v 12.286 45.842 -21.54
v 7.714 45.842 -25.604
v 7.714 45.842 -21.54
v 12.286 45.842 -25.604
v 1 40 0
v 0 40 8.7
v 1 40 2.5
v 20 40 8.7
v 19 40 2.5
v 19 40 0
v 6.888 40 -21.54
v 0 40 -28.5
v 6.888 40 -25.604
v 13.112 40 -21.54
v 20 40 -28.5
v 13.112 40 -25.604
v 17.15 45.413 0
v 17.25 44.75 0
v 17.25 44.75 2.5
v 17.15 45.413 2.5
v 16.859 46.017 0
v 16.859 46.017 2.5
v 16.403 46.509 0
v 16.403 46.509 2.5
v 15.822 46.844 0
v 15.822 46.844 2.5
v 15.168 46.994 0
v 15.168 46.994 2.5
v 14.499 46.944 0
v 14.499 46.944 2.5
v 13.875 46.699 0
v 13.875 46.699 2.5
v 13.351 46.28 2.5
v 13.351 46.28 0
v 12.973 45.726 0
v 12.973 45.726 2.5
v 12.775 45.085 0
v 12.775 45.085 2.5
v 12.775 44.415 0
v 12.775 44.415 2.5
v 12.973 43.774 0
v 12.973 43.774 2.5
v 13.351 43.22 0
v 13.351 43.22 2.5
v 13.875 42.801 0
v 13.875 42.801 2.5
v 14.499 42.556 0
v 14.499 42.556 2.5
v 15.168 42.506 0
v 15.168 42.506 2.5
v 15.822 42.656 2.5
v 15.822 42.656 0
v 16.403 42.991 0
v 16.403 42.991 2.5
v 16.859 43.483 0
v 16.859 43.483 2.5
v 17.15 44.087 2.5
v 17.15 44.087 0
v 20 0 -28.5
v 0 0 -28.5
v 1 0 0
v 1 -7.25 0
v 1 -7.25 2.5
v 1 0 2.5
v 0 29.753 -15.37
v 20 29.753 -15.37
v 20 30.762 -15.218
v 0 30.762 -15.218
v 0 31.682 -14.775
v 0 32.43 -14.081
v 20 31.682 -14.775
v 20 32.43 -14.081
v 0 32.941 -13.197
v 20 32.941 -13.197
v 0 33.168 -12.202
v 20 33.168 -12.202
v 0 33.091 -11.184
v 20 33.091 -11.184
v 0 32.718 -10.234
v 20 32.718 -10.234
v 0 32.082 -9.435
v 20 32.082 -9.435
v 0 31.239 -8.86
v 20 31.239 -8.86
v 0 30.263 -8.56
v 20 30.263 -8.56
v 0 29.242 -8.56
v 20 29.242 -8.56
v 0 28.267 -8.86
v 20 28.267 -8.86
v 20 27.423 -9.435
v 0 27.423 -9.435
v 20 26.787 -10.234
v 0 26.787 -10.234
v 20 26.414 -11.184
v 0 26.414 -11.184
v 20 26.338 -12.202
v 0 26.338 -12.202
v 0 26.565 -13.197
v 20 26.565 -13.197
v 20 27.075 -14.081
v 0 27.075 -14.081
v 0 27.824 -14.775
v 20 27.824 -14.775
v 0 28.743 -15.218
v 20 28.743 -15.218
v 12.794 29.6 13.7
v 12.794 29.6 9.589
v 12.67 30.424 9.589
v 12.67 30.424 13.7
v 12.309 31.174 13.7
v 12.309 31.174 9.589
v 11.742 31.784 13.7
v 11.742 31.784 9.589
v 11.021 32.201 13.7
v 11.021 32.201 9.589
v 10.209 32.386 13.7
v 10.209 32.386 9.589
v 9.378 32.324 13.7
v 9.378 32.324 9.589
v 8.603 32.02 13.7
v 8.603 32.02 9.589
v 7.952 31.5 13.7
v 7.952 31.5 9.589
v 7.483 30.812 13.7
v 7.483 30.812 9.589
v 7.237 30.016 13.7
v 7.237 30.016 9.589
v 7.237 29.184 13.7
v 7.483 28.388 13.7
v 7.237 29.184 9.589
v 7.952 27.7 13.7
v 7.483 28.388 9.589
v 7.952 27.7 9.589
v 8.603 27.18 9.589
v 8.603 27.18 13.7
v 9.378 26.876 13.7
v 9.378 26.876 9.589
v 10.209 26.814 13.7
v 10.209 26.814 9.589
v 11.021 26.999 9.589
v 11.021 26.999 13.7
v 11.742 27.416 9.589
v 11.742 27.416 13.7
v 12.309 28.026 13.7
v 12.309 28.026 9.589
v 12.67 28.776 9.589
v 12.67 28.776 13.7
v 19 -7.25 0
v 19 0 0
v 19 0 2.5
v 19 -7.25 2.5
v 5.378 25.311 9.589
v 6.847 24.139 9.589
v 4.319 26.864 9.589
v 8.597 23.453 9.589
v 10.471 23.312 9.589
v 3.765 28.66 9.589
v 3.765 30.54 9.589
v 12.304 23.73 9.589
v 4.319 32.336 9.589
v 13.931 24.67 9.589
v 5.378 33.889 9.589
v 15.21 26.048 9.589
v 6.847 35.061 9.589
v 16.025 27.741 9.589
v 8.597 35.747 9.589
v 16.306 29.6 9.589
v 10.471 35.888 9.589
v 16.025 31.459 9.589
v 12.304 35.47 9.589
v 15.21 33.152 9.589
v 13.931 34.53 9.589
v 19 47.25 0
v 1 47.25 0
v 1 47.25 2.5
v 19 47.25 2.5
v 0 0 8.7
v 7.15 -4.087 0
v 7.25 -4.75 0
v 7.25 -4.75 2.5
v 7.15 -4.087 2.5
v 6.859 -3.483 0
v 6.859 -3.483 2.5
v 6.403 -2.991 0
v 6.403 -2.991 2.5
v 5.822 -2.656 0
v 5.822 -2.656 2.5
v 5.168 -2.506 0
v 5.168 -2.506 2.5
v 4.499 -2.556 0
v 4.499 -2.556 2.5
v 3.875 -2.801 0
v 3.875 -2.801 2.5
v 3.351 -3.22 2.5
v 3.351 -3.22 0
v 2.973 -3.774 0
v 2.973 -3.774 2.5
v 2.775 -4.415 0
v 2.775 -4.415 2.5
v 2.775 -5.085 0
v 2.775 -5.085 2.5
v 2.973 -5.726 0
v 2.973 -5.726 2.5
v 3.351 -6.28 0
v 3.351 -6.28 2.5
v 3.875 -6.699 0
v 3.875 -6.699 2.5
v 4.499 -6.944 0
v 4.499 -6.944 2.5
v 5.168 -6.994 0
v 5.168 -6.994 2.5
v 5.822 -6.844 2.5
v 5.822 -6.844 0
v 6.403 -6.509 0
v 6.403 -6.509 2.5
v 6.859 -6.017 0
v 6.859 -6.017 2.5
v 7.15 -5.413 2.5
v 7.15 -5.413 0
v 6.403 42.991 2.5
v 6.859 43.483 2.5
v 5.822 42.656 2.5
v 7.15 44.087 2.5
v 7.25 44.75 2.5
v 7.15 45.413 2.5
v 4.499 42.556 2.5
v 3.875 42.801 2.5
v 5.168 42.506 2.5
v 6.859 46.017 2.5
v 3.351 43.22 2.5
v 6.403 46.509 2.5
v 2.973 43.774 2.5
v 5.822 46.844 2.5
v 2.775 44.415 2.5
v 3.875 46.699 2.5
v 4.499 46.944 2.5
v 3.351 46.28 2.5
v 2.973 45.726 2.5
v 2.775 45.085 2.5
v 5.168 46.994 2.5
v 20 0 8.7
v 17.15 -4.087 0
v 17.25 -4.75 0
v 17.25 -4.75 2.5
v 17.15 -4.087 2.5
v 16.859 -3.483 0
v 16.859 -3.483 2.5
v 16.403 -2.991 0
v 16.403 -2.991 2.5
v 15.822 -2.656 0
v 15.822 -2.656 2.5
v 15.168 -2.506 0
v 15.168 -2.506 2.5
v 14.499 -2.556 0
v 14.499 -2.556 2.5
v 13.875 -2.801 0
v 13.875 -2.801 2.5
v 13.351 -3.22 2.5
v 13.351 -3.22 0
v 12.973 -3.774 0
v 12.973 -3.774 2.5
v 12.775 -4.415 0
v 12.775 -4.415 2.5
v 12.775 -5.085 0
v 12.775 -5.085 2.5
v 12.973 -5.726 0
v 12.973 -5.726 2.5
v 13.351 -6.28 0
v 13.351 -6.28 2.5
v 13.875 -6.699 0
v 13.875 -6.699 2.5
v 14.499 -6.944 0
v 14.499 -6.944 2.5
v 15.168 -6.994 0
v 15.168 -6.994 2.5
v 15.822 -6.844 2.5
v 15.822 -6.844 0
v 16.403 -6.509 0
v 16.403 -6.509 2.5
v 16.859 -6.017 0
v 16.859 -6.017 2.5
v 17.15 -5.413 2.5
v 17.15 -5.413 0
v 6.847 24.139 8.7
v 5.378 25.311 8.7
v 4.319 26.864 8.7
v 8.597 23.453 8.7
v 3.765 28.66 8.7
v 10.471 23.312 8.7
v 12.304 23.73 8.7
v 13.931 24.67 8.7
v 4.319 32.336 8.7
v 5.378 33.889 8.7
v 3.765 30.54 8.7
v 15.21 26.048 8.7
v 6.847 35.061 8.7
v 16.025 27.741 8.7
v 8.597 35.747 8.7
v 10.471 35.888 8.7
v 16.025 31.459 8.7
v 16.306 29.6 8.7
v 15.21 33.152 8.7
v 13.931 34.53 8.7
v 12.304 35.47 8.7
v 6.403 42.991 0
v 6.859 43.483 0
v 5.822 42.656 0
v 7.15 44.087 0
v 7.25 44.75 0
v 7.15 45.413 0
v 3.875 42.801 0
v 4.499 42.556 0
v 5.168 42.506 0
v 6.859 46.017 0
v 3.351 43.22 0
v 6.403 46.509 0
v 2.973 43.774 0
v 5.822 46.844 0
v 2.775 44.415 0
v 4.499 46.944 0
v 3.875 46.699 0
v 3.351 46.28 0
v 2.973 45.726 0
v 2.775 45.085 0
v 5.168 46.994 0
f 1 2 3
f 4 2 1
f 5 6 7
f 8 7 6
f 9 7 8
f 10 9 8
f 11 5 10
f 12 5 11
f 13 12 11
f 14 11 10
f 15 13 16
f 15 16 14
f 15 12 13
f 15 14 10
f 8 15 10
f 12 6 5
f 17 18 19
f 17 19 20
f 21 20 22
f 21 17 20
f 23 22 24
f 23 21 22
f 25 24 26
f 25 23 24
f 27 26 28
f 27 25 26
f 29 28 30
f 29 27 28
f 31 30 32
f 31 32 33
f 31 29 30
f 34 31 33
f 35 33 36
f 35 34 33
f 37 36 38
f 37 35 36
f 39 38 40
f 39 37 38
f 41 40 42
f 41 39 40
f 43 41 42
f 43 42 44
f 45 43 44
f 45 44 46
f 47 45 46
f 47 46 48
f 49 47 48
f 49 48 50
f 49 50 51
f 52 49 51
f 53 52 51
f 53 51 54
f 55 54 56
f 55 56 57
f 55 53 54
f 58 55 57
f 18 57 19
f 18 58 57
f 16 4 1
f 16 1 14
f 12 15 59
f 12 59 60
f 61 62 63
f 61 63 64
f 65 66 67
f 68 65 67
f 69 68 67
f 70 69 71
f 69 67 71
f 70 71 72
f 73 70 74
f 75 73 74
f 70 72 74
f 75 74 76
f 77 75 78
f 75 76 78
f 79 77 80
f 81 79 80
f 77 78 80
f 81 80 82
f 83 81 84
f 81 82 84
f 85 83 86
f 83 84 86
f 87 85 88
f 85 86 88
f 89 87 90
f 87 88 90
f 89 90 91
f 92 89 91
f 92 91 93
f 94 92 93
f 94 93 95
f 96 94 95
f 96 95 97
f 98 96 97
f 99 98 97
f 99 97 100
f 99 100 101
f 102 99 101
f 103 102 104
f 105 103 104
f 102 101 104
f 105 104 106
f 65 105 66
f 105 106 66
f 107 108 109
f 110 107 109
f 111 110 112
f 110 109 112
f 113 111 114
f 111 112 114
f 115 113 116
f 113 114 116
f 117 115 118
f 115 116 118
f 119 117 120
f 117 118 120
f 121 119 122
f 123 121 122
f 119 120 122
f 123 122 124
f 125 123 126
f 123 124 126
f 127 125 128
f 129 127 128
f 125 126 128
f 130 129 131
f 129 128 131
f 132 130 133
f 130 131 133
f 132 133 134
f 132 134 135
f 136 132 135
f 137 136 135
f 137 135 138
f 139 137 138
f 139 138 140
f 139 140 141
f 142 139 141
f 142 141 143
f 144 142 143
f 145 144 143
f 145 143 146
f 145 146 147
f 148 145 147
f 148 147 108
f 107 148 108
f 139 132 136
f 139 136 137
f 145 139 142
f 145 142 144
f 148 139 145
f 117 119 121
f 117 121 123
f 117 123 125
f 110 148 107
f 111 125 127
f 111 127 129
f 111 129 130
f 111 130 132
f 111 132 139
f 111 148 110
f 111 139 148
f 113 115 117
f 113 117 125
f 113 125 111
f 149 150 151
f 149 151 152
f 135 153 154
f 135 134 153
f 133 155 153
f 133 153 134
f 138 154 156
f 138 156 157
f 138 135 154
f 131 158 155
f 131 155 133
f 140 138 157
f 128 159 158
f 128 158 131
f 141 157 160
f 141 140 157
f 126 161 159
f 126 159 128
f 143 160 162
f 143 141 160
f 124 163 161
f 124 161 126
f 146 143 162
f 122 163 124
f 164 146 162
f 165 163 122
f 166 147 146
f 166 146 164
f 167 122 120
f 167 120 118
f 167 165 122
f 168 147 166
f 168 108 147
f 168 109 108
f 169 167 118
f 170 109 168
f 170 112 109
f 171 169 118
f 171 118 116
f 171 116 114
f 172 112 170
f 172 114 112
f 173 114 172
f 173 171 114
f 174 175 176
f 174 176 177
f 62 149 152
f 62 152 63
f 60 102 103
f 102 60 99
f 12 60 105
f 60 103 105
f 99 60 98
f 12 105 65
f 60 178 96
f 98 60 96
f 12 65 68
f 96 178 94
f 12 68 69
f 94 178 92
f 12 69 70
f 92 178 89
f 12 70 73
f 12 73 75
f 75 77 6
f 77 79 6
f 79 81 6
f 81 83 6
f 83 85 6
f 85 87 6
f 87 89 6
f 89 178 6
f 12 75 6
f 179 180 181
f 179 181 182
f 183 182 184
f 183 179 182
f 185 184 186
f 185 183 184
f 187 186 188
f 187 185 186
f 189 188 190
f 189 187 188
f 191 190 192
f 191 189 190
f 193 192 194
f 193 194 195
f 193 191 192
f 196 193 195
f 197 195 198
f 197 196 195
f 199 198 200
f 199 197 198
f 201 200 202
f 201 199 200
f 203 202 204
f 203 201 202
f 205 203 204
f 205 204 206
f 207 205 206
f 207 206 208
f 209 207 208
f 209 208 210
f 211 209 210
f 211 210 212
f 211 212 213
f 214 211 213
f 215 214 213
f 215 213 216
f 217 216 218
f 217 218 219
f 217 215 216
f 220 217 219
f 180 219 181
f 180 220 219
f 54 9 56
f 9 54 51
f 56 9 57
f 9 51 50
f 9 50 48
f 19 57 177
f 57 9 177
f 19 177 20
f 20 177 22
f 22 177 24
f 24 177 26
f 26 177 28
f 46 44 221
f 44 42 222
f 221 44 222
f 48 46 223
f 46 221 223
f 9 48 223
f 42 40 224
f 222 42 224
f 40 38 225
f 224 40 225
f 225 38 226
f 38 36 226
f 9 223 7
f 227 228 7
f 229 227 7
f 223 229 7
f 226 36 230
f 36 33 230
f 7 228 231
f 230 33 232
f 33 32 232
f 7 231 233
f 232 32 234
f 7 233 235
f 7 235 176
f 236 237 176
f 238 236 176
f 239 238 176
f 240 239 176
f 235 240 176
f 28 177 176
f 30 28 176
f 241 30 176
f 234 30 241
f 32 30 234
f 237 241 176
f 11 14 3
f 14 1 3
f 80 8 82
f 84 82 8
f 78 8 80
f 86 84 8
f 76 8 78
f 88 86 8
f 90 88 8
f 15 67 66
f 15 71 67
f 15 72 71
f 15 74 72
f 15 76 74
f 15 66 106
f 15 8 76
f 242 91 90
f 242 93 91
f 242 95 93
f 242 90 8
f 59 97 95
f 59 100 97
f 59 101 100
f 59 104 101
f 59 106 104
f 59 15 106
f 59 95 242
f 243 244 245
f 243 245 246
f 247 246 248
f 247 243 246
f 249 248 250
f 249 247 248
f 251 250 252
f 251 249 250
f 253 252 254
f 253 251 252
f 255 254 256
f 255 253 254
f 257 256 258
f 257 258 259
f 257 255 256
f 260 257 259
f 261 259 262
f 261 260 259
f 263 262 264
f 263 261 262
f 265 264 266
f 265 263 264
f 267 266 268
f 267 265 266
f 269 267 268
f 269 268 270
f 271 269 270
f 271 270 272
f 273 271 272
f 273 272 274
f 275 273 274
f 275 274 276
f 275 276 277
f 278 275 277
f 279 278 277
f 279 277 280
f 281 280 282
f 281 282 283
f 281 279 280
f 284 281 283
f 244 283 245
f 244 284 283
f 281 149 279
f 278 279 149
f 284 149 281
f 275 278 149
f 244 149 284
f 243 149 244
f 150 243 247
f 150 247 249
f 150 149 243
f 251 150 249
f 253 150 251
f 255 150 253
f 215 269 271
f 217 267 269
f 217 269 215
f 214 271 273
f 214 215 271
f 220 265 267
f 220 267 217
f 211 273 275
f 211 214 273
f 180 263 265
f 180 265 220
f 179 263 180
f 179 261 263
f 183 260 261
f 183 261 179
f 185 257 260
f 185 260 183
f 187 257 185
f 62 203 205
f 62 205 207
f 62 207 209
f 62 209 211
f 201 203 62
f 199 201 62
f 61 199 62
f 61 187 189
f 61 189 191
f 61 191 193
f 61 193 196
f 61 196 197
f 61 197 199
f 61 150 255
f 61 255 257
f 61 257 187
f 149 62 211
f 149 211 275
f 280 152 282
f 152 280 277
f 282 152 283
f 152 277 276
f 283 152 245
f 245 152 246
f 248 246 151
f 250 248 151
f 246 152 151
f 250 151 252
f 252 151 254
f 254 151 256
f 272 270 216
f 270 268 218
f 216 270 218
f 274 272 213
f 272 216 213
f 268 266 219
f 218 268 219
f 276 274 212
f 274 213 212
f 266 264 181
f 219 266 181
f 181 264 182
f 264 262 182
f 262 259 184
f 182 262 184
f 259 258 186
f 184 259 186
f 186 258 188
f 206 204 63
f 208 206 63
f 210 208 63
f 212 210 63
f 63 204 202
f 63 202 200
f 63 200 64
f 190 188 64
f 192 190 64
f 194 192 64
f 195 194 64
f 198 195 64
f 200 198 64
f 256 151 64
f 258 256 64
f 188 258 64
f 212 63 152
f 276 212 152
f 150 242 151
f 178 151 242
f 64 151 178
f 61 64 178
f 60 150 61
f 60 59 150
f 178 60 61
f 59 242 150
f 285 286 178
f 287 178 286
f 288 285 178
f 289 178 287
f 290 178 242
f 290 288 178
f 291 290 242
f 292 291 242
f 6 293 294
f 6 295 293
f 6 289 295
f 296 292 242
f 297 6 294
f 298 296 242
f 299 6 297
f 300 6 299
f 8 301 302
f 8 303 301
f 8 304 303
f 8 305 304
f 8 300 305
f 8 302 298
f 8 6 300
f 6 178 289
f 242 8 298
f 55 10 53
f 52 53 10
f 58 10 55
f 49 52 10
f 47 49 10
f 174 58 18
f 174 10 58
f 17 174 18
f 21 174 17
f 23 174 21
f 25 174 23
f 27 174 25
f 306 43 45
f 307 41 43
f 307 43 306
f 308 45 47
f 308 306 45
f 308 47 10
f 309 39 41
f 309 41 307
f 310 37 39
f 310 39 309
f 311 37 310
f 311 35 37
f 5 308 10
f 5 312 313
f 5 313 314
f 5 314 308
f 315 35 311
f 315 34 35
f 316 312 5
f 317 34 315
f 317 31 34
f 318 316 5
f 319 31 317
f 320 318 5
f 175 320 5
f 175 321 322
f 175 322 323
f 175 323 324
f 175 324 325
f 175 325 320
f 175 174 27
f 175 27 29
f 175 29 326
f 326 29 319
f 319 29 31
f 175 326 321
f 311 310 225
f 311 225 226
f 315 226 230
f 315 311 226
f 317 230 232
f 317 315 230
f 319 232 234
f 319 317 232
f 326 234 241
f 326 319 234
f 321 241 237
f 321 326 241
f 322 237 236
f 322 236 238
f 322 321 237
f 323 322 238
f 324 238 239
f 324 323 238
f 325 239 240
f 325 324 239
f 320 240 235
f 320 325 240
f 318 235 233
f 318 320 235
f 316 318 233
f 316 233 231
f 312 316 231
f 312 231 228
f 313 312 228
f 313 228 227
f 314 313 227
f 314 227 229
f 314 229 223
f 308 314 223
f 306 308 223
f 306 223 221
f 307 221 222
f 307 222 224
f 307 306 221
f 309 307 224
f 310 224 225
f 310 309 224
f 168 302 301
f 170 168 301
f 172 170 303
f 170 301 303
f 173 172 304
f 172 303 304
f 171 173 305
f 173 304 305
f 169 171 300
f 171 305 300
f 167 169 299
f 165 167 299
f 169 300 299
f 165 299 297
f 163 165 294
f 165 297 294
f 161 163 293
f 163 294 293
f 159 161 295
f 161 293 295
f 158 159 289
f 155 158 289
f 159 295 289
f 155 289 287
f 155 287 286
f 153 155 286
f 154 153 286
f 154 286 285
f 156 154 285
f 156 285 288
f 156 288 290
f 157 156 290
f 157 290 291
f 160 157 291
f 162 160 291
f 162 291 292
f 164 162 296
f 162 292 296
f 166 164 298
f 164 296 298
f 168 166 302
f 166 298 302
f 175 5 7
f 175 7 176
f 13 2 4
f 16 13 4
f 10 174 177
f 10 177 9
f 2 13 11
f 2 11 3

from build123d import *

# Parameters (mm, degrees)
SKETCH1_W           = 20
SKETCH1_H           = 40
BOSS_EXTRUDE1_DEPTH = 8.7
SKETCH2_W           = 20
SKETCH2_H           = 40
BOSS_EXTRUDE2_DEPTH = 28.5
SKETCH3_R           = 2.25
BOSS_EXTRUDE3_DEPTH = 2.5
SKETCH4_R           = 2.794
BOSS_EXTRUDE4_DEPTH = 5
BOSS_EXTRUDE6_DEPTH = 6.9596
SKETCH10_R          = 6.30555
BOSS_EXTRUDE7_DEPTH = 0.889
CUT_EXTRUDE1_DEPTH  = 2.8956
SKETCH15_R          = 3.424566538
CUT_EXTRUDE4_DEPTH  = 20


with BuildPart() as part:
    # Sketch1 → Boss-Extrude1 (new body)
    with BuildSketch(Plane.XY):
        with Locations((10, 20)):
            Rectangle(SKETCH1_W, SKETCH1_H)
    extrude(amount=BOSS_EXTRUDE1_DEPTH)

    # Sketch2 → Boss-Extrude2 (add)
    with BuildSketch(Plane(origin=(0, 0, 0), x_dir=(-1, 0, 0), z_dir=(0, 0, -1))):
        with Locations((-10, 20)):
            Rectangle(SKETCH2_W, SKETCH2_H)
    extrude(amount=BOSS_EXTRUDE2_DEPTH)

    # Sketch3 → Boss-Extrude3 (add)
    with BuildSketch(Plane.XY):
        Polygon((19, 0), (19, -7.25), (1, -7.25), (1, 0), (0, 0), (0, 40), (1, 40), (1, 47.25), (19, 47.25), (19, 40), (20, 40), (20, 0), align=None)
        with Locations((5, -4.75)):
            Circle(SKETCH3_R, mode=Mode.SUBTRACT)
        with Locations((15, -4.75)):
            Circle(SKETCH3_R, mode=Mode.SUBTRACT)
        with Locations((5, 44.75)):
            Circle(SKETCH3_R, mode=Mode.SUBTRACT)
        with Locations((15, 44.75)):
            Circle(SKETCH3_R, mode=Mode.SUBTRACT)
    extrude(amount=BOSS_EXTRUDE3_DEPTH)

    # Sketch4 → Boss-Extrude4 (add)
    with BuildSketch(Plane.XY.offset(8.7)):
        with Locations((10, 29.6)):
            Circle(SKETCH4_R)
    extrude(amount=BOSS_EXTRUDE4_DEPTH)

    # Sketch9 → Boss-Extrude6 (add)
    with BuildSketch(Plane(origin=(0, 0, -28.5), x_dir=(-1, 0, 0), z_dir=(0, 0, -1))):
        Polygon((-13.1115, 40), (-6.8885, 40), (-7.714, 45.842), (-12.286, 45.842), align=None)
    extrude(amount=-BOSS_EXTRUDE6_DEPTH)

    # Sketch10 → Boss-Extrude7 (add)
    with BuildSketch(Plane.XY.offset(8.7)):
        with Locations((10, 29.6)):
            Circle(SKETCH10_R)
    extrude(amount=BOSS_EXTRUDE7_DEPTH)

    # Sketch11 → Cut-Extrude1 (cut)
    with BuildSketch(Plane(origin=(0, 0, -28.5), x_dir=(-1, 0, 0), z_dir=(0, 0, -1))):
        Polygon((-12.286, 45.842), (-7.714, 45.842), (-6.8885, 40), (-13.1115, 40), align=None)
    extrude(amount=-CUT_EXTRUDE1_DEPTH, mode=Mode.SUBTRACT)

    # Sketch15 → Cut-Extrude4 (cut)
    with BuildSketch(Plane(origin=(20, 0, 0), x_dir=(0, 0, -1), z_dir=(1, 0, 0))):
        with Locations((11.945832328, 29.752689179)):
            Circle(SKETCH15_R)
    extrude(amount=-CUT_EXTRUDE4_DEPTH, mode=Mode.SUBTRACT)


solid = part.part
